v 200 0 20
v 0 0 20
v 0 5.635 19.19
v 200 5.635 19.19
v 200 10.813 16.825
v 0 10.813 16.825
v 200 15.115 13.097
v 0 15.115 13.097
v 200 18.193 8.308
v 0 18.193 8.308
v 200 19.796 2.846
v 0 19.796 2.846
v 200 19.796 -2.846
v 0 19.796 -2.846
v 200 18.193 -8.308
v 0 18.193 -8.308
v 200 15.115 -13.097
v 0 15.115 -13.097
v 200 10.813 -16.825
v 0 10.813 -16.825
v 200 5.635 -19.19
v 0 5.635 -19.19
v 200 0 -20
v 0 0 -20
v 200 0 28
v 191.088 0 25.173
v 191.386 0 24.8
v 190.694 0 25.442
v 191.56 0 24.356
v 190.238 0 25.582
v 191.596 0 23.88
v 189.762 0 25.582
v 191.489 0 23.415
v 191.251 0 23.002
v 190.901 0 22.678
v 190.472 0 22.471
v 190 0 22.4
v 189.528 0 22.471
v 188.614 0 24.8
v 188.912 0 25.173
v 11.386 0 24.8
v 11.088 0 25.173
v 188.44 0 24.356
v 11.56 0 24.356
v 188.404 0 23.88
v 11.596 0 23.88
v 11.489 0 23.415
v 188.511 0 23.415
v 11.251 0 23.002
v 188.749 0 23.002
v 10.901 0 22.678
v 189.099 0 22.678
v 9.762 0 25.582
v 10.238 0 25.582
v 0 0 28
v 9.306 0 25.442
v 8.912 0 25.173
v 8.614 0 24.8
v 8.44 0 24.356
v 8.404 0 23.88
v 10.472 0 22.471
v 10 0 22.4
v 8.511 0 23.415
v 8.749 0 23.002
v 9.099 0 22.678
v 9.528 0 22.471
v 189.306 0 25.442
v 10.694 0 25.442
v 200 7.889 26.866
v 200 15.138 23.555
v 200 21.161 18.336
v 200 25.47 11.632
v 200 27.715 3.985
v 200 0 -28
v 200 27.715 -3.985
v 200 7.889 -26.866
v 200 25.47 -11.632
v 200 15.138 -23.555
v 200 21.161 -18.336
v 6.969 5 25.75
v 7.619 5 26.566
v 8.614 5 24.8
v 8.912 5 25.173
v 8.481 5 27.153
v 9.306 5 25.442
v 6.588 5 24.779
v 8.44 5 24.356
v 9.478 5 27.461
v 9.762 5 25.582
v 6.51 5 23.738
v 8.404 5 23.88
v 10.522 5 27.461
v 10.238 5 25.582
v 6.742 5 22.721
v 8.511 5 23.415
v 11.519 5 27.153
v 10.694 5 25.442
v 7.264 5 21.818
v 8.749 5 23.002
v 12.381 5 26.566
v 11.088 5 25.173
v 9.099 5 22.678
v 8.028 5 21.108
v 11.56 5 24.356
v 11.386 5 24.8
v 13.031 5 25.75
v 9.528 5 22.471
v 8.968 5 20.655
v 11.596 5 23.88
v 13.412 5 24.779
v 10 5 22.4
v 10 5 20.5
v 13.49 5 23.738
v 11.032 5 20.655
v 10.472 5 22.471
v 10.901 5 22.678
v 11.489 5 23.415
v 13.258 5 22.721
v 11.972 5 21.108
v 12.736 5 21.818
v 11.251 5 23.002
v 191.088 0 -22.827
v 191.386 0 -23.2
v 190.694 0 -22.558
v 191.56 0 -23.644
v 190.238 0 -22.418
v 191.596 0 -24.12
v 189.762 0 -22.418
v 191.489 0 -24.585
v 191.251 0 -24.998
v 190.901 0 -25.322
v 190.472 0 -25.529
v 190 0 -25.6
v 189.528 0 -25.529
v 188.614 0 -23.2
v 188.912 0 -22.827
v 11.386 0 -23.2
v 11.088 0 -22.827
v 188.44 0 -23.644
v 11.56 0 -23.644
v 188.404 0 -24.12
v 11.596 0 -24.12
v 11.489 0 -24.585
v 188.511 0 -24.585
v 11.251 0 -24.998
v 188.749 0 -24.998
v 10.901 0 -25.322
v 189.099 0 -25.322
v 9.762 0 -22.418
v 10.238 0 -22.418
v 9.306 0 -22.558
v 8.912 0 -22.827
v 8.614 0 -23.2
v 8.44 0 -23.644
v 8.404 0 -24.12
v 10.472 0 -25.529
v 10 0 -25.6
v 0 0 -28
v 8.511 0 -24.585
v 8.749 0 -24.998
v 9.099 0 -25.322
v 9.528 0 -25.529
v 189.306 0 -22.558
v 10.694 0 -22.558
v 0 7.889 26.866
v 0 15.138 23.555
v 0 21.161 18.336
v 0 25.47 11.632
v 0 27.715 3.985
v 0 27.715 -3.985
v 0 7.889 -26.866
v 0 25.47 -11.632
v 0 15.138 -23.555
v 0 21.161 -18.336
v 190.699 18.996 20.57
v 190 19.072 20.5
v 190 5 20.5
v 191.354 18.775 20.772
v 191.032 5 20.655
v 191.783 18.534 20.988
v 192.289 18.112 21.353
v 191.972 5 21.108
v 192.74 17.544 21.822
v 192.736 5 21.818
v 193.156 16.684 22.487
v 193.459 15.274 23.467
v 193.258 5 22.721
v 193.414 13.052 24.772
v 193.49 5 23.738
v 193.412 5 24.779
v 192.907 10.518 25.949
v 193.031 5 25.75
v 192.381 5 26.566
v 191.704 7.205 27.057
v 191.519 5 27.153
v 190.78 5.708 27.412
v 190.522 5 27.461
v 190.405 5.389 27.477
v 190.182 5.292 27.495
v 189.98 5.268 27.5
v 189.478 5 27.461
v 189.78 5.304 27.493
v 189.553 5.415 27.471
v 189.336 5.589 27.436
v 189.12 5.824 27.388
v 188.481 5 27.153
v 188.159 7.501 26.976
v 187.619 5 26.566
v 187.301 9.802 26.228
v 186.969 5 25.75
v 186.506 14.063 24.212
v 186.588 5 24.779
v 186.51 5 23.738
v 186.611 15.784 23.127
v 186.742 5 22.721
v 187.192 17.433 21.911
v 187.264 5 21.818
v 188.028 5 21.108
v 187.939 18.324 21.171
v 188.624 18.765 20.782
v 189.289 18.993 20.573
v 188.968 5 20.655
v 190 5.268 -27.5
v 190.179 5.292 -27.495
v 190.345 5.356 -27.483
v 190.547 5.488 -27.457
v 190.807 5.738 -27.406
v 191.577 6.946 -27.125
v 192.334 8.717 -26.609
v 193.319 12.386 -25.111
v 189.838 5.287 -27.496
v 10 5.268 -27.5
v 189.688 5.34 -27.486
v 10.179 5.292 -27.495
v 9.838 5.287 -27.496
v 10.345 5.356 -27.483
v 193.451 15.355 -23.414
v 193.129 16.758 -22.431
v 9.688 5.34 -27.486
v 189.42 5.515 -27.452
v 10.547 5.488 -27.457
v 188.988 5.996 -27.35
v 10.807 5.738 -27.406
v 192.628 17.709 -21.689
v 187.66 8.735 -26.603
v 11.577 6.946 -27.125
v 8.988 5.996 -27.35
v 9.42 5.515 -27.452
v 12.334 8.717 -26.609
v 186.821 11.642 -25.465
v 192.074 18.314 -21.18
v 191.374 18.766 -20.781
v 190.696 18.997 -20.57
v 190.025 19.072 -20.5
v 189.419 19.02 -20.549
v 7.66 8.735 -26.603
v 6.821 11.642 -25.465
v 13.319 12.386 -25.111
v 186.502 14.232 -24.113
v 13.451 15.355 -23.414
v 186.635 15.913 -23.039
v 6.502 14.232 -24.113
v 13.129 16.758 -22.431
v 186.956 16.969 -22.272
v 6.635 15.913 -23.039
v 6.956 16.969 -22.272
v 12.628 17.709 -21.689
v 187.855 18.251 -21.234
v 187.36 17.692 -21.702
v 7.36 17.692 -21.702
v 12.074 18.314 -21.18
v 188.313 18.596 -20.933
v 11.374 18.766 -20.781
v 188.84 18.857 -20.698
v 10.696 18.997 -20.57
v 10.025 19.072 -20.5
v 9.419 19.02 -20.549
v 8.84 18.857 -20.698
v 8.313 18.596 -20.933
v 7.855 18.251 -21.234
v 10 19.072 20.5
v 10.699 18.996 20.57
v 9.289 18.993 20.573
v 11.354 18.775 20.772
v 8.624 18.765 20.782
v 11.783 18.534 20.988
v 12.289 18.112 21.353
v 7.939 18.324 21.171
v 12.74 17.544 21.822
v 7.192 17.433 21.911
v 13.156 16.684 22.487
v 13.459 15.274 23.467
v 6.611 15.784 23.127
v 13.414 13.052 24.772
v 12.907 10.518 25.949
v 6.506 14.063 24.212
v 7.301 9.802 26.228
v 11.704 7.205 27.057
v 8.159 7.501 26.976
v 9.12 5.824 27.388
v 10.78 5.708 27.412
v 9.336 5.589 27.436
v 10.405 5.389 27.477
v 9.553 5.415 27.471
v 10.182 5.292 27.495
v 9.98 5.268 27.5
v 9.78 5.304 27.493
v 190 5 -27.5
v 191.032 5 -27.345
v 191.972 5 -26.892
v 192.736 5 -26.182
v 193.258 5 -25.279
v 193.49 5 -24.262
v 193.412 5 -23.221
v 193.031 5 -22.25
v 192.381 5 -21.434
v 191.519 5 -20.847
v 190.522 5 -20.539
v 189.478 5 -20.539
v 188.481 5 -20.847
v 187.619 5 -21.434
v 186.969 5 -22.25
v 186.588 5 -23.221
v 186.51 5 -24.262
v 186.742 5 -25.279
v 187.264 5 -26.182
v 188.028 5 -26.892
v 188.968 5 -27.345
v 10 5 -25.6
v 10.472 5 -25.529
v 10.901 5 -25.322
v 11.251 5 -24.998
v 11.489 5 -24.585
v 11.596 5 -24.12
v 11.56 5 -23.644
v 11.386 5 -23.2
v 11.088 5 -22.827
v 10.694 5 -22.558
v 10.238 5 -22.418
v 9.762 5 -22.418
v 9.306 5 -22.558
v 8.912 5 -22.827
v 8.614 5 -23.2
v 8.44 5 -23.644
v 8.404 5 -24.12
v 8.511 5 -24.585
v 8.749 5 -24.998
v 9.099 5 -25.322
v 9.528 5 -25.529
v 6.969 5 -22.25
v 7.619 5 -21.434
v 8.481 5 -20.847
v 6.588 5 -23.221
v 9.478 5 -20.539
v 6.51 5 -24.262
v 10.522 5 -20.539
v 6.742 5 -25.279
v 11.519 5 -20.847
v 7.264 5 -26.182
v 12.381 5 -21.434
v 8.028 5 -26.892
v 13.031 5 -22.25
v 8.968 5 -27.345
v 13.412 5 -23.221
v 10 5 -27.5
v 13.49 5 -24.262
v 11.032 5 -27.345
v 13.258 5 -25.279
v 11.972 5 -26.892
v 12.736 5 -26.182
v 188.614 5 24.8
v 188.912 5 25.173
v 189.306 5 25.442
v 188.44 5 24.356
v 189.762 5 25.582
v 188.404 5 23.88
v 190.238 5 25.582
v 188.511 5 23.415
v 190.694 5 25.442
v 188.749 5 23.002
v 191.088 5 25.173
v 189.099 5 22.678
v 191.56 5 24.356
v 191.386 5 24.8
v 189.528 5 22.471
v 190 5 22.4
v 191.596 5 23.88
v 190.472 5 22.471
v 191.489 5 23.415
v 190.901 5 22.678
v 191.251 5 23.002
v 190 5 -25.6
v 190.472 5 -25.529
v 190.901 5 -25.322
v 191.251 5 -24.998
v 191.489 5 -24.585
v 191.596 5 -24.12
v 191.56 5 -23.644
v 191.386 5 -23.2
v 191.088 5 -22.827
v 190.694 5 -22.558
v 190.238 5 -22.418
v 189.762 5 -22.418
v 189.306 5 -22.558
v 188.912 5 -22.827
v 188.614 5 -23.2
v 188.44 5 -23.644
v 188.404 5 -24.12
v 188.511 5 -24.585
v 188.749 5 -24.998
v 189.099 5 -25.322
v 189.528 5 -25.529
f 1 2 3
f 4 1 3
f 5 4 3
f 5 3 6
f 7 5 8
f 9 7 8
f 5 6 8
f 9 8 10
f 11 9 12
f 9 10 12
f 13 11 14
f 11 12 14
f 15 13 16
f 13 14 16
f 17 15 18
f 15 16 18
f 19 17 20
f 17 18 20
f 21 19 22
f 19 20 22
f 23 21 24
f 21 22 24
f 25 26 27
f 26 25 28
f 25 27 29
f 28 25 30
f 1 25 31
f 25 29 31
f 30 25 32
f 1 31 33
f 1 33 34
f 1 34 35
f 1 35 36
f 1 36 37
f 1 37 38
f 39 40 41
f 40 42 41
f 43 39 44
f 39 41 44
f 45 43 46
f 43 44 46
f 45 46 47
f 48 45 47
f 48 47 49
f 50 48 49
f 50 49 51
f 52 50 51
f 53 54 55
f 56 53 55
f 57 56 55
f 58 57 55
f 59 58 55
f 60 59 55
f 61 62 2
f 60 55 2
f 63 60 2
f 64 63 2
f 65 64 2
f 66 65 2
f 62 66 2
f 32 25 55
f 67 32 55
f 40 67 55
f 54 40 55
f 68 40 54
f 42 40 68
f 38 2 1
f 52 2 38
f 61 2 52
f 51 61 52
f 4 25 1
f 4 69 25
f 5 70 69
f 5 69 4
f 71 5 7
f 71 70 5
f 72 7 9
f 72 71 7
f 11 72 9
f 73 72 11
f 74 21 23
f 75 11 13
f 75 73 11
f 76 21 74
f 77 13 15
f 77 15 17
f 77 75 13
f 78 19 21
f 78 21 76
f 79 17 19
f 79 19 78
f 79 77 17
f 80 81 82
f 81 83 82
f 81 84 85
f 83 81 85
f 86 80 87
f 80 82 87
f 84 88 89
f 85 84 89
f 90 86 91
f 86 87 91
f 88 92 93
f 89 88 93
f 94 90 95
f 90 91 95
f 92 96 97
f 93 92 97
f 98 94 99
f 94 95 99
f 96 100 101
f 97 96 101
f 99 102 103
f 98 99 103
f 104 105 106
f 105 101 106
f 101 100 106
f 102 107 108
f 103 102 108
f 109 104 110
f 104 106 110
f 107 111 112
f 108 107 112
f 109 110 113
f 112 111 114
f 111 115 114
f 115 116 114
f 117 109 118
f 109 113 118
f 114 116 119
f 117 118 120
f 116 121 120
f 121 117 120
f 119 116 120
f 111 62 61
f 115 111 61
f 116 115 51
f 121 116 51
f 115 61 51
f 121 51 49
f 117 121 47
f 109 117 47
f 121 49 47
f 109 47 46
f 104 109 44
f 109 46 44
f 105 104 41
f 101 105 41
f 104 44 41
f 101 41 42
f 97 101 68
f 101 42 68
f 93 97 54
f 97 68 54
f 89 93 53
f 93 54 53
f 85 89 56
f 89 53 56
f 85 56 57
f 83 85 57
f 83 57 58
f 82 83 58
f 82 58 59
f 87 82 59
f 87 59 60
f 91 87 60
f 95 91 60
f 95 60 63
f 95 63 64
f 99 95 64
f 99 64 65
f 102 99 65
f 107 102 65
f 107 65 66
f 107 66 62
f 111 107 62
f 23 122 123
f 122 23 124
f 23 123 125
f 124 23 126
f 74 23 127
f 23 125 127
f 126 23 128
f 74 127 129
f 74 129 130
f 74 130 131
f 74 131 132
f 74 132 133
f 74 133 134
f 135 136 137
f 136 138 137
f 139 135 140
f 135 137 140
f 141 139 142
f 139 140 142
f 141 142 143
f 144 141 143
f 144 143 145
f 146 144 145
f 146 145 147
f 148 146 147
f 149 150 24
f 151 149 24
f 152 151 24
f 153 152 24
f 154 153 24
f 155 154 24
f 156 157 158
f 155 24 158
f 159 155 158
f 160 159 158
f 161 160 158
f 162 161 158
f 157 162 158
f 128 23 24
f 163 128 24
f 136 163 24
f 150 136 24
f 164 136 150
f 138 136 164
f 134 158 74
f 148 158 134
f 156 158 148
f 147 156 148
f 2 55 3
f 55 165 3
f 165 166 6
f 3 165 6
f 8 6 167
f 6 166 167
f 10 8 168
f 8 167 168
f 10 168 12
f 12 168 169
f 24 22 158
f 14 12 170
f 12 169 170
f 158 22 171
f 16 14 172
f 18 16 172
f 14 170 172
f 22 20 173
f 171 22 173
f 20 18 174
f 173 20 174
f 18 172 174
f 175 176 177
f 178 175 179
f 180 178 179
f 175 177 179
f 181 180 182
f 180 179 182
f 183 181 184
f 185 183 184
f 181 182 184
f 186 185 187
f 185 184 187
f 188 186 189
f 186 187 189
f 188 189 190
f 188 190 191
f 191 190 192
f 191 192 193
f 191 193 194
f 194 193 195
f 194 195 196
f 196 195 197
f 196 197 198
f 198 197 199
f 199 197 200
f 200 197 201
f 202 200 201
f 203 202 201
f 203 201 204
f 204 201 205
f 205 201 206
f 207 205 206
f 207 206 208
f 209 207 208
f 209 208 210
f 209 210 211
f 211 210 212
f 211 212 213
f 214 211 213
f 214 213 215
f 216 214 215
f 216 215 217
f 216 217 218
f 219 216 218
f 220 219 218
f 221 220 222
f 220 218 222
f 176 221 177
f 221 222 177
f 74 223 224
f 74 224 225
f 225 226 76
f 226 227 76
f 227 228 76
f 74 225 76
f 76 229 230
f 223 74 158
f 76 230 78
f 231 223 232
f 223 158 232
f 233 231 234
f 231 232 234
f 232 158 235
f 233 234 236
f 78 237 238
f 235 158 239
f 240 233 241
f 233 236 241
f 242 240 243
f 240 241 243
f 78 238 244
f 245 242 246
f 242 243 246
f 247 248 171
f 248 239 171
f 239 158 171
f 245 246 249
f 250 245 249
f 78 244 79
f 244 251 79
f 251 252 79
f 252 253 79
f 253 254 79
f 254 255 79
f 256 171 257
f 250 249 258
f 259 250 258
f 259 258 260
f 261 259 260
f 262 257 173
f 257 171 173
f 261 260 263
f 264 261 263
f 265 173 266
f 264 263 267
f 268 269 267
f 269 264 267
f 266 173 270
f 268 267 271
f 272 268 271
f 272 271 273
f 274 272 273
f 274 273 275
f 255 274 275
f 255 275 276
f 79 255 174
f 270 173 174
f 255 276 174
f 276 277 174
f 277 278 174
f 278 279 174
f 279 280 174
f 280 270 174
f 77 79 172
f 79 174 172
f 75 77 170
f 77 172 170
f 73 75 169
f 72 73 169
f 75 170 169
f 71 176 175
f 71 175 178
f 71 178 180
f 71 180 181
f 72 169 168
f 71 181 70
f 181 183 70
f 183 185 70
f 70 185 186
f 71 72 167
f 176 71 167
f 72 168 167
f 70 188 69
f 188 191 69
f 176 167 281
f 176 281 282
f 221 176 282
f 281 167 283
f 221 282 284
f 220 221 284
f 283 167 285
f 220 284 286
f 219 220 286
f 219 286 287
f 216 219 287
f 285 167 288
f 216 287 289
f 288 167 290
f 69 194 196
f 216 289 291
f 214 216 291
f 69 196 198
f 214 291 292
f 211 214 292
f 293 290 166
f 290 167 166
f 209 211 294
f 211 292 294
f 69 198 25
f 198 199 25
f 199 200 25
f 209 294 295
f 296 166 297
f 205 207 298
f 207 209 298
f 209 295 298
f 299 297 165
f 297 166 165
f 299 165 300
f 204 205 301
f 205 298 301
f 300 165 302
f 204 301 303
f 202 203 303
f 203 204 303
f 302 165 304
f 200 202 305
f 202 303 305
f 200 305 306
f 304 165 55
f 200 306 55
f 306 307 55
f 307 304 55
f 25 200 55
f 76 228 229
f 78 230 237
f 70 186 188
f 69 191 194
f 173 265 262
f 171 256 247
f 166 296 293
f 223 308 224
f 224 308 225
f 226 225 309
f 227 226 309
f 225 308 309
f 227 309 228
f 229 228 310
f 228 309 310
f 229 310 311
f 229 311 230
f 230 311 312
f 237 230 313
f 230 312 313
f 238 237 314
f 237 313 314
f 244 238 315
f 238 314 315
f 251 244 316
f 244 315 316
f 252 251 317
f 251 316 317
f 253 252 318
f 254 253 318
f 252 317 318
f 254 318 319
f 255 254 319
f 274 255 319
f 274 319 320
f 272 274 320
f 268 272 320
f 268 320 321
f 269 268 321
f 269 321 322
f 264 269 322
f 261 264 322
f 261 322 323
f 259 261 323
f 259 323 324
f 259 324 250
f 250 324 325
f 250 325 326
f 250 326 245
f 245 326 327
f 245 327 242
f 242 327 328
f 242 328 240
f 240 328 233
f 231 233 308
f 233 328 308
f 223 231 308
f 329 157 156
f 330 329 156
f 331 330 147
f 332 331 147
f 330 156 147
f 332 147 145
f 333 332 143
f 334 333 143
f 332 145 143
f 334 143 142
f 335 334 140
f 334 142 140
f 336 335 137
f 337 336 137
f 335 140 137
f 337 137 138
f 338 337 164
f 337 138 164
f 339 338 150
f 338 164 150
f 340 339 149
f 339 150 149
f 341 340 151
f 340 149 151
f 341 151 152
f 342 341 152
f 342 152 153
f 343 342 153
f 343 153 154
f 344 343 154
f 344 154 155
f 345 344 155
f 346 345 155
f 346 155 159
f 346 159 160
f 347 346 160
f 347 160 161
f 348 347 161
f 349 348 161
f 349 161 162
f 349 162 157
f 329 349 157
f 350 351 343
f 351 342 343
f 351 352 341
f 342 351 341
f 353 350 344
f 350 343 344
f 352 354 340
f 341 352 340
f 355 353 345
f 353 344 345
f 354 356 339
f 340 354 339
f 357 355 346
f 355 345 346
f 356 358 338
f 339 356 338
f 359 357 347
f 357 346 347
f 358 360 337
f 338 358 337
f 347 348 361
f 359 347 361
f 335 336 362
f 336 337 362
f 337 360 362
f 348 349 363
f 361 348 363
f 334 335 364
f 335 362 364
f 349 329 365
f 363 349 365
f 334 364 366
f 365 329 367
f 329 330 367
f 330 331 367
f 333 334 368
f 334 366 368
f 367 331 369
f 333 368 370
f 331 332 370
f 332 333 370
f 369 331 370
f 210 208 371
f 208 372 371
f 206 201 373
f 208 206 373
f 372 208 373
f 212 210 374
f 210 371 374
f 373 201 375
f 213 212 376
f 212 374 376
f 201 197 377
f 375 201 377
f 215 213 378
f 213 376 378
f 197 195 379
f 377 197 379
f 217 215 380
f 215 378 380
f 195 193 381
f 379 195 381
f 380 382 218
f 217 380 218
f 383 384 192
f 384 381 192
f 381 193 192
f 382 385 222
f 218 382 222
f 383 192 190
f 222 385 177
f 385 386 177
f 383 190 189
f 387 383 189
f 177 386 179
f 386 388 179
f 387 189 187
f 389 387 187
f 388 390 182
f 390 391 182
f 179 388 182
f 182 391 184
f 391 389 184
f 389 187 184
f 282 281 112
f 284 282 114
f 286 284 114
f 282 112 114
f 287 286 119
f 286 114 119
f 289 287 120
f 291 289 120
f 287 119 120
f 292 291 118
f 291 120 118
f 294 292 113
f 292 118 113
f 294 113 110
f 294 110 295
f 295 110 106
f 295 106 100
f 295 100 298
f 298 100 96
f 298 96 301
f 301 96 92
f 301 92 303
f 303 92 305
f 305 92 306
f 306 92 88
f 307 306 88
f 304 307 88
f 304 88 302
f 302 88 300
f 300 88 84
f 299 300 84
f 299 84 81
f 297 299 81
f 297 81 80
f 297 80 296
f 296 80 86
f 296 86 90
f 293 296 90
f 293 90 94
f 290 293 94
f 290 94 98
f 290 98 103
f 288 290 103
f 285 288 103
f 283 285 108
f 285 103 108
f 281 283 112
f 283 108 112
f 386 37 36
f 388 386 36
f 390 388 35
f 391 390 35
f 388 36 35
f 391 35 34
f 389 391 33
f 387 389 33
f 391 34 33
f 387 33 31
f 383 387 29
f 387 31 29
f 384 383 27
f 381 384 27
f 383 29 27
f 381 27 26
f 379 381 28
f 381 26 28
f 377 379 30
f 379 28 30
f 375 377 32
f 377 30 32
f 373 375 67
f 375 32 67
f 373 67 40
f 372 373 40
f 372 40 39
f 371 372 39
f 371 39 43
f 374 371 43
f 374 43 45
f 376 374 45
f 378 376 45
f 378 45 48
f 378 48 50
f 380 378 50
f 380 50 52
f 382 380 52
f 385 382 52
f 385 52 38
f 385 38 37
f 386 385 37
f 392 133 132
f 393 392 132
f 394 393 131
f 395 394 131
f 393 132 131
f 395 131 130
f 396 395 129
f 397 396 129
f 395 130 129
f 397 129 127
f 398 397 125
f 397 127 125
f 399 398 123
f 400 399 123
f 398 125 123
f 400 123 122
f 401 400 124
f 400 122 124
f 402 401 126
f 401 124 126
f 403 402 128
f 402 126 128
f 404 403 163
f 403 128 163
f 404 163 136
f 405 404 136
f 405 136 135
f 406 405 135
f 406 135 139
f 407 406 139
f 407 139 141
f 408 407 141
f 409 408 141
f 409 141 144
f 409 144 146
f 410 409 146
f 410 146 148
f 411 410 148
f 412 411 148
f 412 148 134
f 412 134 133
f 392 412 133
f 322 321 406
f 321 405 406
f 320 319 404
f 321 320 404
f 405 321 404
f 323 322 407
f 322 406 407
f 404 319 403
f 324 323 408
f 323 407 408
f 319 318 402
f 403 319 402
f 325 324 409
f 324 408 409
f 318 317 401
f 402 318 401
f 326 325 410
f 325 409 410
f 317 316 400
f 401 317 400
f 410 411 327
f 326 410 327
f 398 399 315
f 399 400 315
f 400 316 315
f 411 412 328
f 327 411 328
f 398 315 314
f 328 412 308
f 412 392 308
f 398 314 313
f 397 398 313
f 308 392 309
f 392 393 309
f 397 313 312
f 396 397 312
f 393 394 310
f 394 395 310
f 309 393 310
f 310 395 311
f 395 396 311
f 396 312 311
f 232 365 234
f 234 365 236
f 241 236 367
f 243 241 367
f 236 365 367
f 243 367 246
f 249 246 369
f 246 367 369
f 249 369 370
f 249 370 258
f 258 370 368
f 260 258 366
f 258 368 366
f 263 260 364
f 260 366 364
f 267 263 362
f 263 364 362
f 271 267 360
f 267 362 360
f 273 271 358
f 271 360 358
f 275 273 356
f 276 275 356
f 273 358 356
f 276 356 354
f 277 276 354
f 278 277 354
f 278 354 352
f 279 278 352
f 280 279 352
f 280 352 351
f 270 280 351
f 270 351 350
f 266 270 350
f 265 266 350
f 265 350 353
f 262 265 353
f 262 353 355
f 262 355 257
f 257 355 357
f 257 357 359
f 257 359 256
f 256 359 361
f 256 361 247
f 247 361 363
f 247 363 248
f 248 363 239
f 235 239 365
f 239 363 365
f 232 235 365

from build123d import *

# Parameters (mm, degrees)
AUFSATZ_LINEAR_AUSTRAGEN1_DEPTH = 200
SKIZZE2_R                       = 1.6
SCHNITT_LINEAR_AUSTRAGEN1_DEPTH = 204.882318998
SCHNITT_LINEAR_START            = -5
SKIZZE3_R                       = 3.5
SCHNITT_LINEAR_AUSTRAGEN2_DEPTH = 199.882319124


with BuildPart() as part:
    # Skizze1 → Aufsatz-Linear austragen1 (new body)
    with BuildSketch(Plane(origin=(0, 0, 0), x_dir=(0, 0, -1), z_dir=(1, 0, 0))):
        with BuildLine():
            Line((-28, 0), (-20, 0))
            ThreePointArc((-20, 0), (0, 20), (20, 0))
            Line((20, 0), (28, 0))
            ThreePointArc((28, 0), (0, 28), (-28, 0))
        make_face()
    extrude(amount=AUFSATZ_LINEAR_AUSTRAGEN1_DEPTH)

    # Skizze2 → Schnitt-Linear austragen1 (cut, through all)
    with BuildSketch(Plane.XZ):
        with Locations(Location((10, 24, 0), (0, 0, 270))):
            Circle(SKIZZE2_R)
        with Locations(Location((190, 24, 0), (0, 0, 270))):
            Circle(SKIZZE2_R)
        with Locations(Location((190, -24, 0), (0, 0, 270))):
            Circle(SKIZZE2_R)
        with Locations(Location((10, -24, 0), (0, 0, 270))):
            Circle(SKIZZE2_R)
    extrude(amount=-SCHNITT_LINEAR_AUSTRAGEN1_DEPTH, mode=Mode.SUBTRACT)

    # Skizze3 → Schnitt-Linear austragen2 (cut, through all)
    with BuildSketch(Plane.XZ.offset(SCHNITT_LINEAR_START)):
        with Locations(Location((10, 24, 0), (0, 0, 270))):
            Circle(SKIZZE3_R)
        with Locations(Location((190, 24, 0), (0, 0, 270))):
            Circle(SKIZZE3_R)
        with Locations(Location((190, -24, 0), (0, 0, 270))):
            Circle(SKIZZE3_R)
        with Locations(Location((10, -24, 0), (0, 0, 270))):
            Circle(SKIZZE3_R)
    extrude(amount=-SCHNITT_LINEAR_AUSTRAGEN2_DEPTH, mode=Mode.SUBTRACT)


solid = part.part
